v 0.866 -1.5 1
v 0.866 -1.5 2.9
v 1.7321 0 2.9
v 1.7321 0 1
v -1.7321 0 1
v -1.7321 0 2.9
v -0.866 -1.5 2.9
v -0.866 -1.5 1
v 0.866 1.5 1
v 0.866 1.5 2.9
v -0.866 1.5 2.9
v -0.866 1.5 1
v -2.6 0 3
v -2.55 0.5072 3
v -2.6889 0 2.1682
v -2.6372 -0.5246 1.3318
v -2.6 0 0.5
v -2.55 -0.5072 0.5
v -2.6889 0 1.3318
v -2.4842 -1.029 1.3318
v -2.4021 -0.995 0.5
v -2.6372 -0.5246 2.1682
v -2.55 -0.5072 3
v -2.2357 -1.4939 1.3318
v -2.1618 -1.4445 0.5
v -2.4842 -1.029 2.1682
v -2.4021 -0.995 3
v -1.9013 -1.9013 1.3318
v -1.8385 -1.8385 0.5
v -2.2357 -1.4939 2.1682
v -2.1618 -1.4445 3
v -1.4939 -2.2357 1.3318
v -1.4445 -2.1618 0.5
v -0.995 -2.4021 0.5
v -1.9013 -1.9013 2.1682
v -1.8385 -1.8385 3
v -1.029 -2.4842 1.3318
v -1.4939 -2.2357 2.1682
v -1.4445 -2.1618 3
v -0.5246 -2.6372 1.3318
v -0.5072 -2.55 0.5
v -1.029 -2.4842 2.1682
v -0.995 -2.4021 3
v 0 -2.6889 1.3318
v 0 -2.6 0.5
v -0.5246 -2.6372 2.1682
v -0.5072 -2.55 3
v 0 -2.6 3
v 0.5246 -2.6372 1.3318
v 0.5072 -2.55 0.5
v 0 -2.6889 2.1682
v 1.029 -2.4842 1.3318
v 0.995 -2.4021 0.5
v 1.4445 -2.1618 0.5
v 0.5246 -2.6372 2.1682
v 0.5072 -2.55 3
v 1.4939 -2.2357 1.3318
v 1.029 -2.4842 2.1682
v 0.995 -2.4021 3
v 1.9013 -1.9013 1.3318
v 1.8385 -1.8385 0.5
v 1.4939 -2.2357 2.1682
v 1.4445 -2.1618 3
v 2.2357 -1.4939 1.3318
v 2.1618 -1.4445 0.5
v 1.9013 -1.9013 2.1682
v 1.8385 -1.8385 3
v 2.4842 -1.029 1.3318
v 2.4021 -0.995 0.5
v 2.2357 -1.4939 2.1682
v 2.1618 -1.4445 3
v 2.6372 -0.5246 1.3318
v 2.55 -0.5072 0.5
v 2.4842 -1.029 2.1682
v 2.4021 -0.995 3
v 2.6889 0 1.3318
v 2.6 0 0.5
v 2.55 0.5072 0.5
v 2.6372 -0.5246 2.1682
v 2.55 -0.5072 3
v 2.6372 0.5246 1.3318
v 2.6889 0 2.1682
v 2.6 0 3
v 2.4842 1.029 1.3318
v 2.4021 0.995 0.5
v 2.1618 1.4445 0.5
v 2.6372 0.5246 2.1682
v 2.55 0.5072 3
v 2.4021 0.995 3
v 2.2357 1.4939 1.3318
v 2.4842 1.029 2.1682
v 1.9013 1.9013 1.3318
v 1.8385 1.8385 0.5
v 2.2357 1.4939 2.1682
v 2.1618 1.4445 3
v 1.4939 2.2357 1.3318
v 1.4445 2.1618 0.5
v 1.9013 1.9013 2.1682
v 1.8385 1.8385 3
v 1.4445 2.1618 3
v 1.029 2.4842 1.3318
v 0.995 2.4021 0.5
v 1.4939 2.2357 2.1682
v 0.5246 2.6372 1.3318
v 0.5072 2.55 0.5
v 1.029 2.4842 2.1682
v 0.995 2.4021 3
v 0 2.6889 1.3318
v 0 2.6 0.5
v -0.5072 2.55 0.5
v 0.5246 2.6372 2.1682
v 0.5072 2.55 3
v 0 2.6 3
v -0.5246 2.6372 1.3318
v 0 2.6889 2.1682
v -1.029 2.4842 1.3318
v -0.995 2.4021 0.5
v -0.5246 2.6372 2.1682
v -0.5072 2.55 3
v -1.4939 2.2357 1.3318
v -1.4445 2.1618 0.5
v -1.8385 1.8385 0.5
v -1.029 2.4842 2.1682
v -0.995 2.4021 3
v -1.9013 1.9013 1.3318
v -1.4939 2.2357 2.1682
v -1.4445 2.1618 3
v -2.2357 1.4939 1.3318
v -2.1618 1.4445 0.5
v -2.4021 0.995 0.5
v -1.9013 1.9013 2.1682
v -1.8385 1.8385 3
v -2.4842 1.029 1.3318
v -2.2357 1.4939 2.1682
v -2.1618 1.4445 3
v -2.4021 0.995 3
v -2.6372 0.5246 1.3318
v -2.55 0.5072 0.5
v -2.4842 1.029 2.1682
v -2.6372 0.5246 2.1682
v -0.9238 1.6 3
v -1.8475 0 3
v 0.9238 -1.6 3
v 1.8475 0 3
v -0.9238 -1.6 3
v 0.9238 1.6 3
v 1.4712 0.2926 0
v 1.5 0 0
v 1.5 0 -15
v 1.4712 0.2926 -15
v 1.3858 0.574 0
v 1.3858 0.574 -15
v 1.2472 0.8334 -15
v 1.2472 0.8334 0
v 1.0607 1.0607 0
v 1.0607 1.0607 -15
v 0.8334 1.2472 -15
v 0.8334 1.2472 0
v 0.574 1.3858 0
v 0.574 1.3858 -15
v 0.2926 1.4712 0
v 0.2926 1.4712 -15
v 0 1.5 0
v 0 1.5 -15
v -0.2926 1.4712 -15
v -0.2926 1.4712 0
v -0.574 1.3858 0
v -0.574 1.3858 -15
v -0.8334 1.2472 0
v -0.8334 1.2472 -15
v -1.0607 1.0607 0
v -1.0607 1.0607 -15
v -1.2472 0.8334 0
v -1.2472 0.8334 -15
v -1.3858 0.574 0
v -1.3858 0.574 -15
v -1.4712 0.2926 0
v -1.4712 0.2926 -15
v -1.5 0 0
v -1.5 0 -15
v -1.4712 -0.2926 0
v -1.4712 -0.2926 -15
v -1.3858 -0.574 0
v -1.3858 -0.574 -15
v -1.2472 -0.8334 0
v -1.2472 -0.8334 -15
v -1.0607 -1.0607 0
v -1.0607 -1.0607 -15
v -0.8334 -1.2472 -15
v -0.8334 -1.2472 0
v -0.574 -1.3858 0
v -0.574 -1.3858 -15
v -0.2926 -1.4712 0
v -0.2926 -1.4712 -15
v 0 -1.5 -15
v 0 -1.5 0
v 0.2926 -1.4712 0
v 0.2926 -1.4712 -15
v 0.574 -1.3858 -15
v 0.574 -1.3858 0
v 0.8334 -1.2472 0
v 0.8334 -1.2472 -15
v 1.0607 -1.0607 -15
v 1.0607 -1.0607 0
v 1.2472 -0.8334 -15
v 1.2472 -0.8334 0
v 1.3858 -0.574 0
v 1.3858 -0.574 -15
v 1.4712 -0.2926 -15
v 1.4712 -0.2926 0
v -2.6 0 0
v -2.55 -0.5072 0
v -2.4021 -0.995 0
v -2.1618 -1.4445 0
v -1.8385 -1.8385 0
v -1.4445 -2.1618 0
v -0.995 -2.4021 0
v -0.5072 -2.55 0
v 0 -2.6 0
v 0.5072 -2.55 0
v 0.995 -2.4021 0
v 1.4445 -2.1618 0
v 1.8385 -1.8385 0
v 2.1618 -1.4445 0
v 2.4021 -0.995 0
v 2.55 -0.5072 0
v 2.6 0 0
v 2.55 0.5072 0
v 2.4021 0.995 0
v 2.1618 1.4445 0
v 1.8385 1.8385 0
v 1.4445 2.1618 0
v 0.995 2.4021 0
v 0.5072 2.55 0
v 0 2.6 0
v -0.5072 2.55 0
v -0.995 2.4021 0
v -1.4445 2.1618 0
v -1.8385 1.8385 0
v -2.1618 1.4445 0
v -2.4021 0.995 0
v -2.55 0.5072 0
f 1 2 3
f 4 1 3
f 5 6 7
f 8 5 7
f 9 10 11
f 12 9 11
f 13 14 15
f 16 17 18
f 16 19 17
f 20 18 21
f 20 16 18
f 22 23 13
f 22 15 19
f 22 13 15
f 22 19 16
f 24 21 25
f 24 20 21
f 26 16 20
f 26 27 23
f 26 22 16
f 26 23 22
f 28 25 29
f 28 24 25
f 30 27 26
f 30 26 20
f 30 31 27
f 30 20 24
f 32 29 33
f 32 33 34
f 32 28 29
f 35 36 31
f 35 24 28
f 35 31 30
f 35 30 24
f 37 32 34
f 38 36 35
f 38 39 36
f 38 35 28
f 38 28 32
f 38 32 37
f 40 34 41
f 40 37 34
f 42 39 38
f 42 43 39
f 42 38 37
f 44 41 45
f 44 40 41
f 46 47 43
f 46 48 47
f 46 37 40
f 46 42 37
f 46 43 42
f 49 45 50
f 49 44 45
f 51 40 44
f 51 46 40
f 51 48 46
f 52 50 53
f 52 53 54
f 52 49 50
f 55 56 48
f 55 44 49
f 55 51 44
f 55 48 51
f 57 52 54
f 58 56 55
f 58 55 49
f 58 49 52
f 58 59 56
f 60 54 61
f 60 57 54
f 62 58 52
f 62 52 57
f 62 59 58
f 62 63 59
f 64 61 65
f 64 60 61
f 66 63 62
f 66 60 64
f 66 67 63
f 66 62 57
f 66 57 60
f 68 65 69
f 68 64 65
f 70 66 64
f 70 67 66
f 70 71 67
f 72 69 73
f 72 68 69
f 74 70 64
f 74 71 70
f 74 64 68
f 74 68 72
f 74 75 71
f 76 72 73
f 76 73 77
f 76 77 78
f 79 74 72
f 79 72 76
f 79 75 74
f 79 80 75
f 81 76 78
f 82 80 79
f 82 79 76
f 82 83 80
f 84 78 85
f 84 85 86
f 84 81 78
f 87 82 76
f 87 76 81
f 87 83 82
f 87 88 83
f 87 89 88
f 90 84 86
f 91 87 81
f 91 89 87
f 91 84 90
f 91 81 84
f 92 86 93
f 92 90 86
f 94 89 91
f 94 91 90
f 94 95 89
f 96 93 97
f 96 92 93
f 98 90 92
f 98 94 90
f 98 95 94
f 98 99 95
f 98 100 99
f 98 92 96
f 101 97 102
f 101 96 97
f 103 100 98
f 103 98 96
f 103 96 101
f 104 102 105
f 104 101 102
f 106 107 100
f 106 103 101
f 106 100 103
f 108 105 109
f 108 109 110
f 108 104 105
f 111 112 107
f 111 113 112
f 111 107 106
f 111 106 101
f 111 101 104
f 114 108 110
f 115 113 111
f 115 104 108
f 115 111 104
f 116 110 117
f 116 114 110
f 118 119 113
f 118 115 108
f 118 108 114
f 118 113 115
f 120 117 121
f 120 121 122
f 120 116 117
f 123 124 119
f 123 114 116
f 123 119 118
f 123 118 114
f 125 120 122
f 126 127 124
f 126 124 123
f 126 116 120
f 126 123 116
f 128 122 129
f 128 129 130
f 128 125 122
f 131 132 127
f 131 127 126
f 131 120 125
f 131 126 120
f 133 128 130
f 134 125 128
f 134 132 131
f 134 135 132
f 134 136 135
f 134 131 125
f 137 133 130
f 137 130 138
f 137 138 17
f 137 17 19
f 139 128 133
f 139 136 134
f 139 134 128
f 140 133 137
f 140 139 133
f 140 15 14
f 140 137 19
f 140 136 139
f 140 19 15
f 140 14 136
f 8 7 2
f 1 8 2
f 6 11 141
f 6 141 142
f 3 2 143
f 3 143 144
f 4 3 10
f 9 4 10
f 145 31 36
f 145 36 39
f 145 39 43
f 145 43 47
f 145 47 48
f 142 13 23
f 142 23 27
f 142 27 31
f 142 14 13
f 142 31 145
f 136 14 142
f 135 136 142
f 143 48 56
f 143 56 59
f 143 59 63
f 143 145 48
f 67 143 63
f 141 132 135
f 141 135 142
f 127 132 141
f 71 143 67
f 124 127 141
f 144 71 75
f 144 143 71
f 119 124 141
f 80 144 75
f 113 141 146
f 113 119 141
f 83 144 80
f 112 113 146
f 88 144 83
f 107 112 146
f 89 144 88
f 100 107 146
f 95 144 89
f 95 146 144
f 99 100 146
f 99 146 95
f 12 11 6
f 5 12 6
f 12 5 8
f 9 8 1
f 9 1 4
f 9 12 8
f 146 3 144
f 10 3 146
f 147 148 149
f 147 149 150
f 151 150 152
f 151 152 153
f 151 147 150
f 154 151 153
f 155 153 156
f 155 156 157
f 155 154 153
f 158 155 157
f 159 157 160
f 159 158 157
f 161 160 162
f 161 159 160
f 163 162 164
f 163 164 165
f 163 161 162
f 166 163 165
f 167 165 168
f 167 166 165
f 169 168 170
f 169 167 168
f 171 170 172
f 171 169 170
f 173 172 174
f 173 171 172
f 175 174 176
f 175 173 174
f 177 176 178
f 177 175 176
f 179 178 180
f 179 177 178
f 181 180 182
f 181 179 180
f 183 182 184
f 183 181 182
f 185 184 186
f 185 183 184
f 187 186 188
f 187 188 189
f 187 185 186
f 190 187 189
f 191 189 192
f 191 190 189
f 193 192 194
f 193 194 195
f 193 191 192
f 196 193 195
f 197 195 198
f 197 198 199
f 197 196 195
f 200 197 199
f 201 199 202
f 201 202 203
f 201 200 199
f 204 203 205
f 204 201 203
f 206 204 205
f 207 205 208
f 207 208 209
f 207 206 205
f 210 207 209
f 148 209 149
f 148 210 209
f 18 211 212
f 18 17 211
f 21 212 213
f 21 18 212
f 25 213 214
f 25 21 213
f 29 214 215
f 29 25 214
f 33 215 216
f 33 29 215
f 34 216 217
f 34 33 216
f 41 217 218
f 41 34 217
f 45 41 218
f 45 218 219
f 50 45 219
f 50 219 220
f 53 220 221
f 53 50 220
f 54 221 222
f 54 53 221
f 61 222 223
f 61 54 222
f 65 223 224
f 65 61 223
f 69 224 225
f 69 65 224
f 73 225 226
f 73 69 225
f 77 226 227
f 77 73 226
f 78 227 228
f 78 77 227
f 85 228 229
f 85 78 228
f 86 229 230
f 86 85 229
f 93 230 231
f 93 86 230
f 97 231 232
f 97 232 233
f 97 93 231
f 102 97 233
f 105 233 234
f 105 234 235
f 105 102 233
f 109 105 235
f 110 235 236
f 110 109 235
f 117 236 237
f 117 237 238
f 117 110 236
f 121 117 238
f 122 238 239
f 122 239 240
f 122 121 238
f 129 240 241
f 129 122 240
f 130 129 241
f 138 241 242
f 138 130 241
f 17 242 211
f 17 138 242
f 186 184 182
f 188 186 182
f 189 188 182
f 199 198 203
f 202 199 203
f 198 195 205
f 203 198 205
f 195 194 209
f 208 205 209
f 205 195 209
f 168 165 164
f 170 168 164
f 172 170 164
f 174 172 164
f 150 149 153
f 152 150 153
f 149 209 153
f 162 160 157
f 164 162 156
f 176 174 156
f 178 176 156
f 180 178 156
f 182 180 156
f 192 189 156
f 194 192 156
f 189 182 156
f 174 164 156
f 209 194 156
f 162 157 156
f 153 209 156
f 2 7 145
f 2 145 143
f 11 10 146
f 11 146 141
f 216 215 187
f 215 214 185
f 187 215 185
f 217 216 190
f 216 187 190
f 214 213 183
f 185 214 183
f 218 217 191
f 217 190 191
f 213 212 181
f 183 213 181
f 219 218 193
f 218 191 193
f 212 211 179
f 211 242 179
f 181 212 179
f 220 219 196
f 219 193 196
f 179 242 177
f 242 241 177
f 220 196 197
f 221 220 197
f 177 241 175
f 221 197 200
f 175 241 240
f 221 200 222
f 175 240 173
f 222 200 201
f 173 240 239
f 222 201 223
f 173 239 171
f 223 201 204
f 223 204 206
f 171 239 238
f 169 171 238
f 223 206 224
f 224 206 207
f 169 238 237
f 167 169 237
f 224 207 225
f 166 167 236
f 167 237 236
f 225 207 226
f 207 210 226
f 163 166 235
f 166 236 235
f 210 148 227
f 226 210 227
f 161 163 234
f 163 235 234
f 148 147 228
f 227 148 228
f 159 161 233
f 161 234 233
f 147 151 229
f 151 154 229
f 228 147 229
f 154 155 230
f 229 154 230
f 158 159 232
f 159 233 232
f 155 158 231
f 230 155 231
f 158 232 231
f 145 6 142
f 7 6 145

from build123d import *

# Parameters (mm, degrees)
SKETCH1_R           = 1.5
BOSS_EXTRUDE1_DEPTH = 15
SKETCH2_R           = 2.75
BOSS_EXTRUDE2_DEPTH = 3
CUT_EXTRUDE1_DEPTH  = 2
CHAMFER1_SIZE       = 0.1


with BuildPart() as part:
    # Sketch1 → Boss-Extrude1 (new body)
    with BuildSketch(Plane.XY):
        Circle(SKETCH1_R)
    extrude(amount=-BOSS_EXTRUDE1_DEPTH)

    # Sketch2 → Boss-Extrude2 (add)
    with BuildSketch(Plane.XY):
        Circle(SKETCH2_R)
    extrude(amount=BOSS_EXTRUDE2_DEPTH)

    # Sketch3 → Cut-Revolve1 (revolve, cut)
    with BuildSketch(Plane(origin=(0, 0, 0), x_dir=(0, 0, -1), z_dir=(1, 0, 0)), mode=Mode.PRIVATE) as cut_revolve1_sk:
        with BuildLine():
            Line((-3, 2.6), (-3, 3.1))
            Line((-3, 3.1), (0, 3.1))
            Line((0, 3.1), (0, 2.6))
            Line((0, 2.6), (-0.5, 2.6))
            ThreePointArc((-0.5, 2.6), (-1.75, 2.7), (-3, 2.6))
        make_face()
    revolve(cut_revolve1_sk.sketch.rotate(Axis((0, 0, 3), (0, 0, 1)), 90), axis=Axis((0, 0, 3), (0, 0, 1)), mode=Mode.SUBTRACT)

    # Sketch4 → Cut-Extrude1 (cut)
    with BuildSketch(Plane.XY.offset(3)):
        Polygon((1.732050808, 0), (0.866025404, 1.5), (-0.866025404, 1.5), (-1.732050808, 0), (-0.866025404, -1.5), (0.866025404, -1.5), align=None)
    extrude(amount=-CUT_EXTRUDE1_DEPTH, mode=Mode.SUBTRACT)

    # Chamfer1
    chamfer1_edges = [part.edges().sort_by_distance(p)[0] for p in [
        (1.299038106, -0.75, 3),
        (1.299038106, 0.75, 3),
        (0, 1.5, 3),
        (-1.299038106, 0.75, 3),
        (-1.299038106, -0.75, 3),
        (0, -1.5, 3),
    ]]
    chamfer(chamfer1_edges, length=CHAMFER1_SIZE)


solid = part.part
